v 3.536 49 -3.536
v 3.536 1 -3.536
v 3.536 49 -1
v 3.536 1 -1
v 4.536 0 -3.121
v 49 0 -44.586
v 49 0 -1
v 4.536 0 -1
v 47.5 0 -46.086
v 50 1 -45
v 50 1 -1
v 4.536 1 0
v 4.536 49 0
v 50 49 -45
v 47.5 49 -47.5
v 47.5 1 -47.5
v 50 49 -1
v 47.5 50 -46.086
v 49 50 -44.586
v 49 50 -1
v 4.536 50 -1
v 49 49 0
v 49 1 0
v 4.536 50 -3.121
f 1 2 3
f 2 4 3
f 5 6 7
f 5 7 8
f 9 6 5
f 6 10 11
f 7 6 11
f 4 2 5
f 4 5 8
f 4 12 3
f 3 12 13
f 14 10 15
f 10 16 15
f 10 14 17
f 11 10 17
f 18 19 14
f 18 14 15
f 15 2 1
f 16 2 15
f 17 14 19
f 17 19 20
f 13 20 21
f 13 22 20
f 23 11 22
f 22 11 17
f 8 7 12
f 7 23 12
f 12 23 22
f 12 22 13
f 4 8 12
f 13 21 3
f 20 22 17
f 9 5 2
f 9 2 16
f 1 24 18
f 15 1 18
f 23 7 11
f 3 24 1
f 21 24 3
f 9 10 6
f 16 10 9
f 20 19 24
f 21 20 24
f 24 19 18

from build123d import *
from OCP.BRepFilletAPI import BRepFilletAPI_MakeChamfer

# Parameters (mm, degrees)
EXTRUDE_1_DEPTH = 50
CHAMFER_1_SIZE  = 5
CHAMFER_1_SIZE2 = 3.535533906
CHAMFER_2_SIZE  = 1


with BuildPart() as part:
    # 草图1 → 凸台-拉伸1 (new body)
    with BuildSketch(Plane(origin=(0, 0, 0), x_dir=(1, 0, 0), z_dir=(0, 1, 0))):
        Polygon((0, 0), (50, 50), (50, 0), align=None)
    extrude(amount=EXTRUDE_1_DEPTH)

    # 倒角1: one chamfer whose edges measure the first distance from different faces: ONE call of the kernel's chamfer builder (chamfer() names one face for all edges)
    chamfer_1_edges_1 = [part.edges().sort_by_distance(p)[0] for p in [
        (0, 25, 0),
    ]]
    chamfer_1_side_1 = [part.faces().sort_by_distance(p)[0] for p in [
        (25, 25, -25),
    ]]
    chamfer_1_edges_2 = [part.edges().sort_by_distance(p)[0] for p in [
        (50, 25, -50),
    ]]
    chamfer_1_side_2 = [part.faces().sort_by_distance(p)[0] for p in [
        (50, 25, -25),
    ]]
    chamfer_1 = BRepFilletAPI_MakeChamfer(part.part.solid().wrapped)
    for e in chamfer_1_edges_1:
        chamfer_1.Add(CHAMFER_1_SIZE, CHAMFER_1_SIZE2, e.wrapped, chamfer_1_side_1[0].wrapped)  # the first distance lies on this face
    for e in chamfer_1_edges_2:
        chamfer_1.Add(CHAMFER_1_SIZE, CHAMFER_1_SIZE2, e.wrapped, chamfer_1_side_2[0].wrapped)  # the first distance lies on this face
    add(Compound.cast(chamfer_1.Shape()), mode=Mode.REPLACE)

    # 倒角2
    chamfer_2_edges = [part.edges().sort_by_distance(p)[0] for p in [
        (25.517766953, 0, -25.517766953),
        (25.517766953, 50, -25.517766953),
        (26.767766953, 0, 0),
        (3.535533906, 0, -1.767766953),
        (48.75, 0, -46.25),
        (26.767766953, 50, 0),
        (3.535533906, 50, -1.767766953),
        (48.75, 50, -46.25),
        (3.535533906, 25, 0),
        (50, 0, -22.5),
        (50, 25, 0),
        (50, 50, -22.5),
    ]]
    chamfer(chamfer_2_edges, length=CHAMFER_2_SIZE)


solid = part.part
